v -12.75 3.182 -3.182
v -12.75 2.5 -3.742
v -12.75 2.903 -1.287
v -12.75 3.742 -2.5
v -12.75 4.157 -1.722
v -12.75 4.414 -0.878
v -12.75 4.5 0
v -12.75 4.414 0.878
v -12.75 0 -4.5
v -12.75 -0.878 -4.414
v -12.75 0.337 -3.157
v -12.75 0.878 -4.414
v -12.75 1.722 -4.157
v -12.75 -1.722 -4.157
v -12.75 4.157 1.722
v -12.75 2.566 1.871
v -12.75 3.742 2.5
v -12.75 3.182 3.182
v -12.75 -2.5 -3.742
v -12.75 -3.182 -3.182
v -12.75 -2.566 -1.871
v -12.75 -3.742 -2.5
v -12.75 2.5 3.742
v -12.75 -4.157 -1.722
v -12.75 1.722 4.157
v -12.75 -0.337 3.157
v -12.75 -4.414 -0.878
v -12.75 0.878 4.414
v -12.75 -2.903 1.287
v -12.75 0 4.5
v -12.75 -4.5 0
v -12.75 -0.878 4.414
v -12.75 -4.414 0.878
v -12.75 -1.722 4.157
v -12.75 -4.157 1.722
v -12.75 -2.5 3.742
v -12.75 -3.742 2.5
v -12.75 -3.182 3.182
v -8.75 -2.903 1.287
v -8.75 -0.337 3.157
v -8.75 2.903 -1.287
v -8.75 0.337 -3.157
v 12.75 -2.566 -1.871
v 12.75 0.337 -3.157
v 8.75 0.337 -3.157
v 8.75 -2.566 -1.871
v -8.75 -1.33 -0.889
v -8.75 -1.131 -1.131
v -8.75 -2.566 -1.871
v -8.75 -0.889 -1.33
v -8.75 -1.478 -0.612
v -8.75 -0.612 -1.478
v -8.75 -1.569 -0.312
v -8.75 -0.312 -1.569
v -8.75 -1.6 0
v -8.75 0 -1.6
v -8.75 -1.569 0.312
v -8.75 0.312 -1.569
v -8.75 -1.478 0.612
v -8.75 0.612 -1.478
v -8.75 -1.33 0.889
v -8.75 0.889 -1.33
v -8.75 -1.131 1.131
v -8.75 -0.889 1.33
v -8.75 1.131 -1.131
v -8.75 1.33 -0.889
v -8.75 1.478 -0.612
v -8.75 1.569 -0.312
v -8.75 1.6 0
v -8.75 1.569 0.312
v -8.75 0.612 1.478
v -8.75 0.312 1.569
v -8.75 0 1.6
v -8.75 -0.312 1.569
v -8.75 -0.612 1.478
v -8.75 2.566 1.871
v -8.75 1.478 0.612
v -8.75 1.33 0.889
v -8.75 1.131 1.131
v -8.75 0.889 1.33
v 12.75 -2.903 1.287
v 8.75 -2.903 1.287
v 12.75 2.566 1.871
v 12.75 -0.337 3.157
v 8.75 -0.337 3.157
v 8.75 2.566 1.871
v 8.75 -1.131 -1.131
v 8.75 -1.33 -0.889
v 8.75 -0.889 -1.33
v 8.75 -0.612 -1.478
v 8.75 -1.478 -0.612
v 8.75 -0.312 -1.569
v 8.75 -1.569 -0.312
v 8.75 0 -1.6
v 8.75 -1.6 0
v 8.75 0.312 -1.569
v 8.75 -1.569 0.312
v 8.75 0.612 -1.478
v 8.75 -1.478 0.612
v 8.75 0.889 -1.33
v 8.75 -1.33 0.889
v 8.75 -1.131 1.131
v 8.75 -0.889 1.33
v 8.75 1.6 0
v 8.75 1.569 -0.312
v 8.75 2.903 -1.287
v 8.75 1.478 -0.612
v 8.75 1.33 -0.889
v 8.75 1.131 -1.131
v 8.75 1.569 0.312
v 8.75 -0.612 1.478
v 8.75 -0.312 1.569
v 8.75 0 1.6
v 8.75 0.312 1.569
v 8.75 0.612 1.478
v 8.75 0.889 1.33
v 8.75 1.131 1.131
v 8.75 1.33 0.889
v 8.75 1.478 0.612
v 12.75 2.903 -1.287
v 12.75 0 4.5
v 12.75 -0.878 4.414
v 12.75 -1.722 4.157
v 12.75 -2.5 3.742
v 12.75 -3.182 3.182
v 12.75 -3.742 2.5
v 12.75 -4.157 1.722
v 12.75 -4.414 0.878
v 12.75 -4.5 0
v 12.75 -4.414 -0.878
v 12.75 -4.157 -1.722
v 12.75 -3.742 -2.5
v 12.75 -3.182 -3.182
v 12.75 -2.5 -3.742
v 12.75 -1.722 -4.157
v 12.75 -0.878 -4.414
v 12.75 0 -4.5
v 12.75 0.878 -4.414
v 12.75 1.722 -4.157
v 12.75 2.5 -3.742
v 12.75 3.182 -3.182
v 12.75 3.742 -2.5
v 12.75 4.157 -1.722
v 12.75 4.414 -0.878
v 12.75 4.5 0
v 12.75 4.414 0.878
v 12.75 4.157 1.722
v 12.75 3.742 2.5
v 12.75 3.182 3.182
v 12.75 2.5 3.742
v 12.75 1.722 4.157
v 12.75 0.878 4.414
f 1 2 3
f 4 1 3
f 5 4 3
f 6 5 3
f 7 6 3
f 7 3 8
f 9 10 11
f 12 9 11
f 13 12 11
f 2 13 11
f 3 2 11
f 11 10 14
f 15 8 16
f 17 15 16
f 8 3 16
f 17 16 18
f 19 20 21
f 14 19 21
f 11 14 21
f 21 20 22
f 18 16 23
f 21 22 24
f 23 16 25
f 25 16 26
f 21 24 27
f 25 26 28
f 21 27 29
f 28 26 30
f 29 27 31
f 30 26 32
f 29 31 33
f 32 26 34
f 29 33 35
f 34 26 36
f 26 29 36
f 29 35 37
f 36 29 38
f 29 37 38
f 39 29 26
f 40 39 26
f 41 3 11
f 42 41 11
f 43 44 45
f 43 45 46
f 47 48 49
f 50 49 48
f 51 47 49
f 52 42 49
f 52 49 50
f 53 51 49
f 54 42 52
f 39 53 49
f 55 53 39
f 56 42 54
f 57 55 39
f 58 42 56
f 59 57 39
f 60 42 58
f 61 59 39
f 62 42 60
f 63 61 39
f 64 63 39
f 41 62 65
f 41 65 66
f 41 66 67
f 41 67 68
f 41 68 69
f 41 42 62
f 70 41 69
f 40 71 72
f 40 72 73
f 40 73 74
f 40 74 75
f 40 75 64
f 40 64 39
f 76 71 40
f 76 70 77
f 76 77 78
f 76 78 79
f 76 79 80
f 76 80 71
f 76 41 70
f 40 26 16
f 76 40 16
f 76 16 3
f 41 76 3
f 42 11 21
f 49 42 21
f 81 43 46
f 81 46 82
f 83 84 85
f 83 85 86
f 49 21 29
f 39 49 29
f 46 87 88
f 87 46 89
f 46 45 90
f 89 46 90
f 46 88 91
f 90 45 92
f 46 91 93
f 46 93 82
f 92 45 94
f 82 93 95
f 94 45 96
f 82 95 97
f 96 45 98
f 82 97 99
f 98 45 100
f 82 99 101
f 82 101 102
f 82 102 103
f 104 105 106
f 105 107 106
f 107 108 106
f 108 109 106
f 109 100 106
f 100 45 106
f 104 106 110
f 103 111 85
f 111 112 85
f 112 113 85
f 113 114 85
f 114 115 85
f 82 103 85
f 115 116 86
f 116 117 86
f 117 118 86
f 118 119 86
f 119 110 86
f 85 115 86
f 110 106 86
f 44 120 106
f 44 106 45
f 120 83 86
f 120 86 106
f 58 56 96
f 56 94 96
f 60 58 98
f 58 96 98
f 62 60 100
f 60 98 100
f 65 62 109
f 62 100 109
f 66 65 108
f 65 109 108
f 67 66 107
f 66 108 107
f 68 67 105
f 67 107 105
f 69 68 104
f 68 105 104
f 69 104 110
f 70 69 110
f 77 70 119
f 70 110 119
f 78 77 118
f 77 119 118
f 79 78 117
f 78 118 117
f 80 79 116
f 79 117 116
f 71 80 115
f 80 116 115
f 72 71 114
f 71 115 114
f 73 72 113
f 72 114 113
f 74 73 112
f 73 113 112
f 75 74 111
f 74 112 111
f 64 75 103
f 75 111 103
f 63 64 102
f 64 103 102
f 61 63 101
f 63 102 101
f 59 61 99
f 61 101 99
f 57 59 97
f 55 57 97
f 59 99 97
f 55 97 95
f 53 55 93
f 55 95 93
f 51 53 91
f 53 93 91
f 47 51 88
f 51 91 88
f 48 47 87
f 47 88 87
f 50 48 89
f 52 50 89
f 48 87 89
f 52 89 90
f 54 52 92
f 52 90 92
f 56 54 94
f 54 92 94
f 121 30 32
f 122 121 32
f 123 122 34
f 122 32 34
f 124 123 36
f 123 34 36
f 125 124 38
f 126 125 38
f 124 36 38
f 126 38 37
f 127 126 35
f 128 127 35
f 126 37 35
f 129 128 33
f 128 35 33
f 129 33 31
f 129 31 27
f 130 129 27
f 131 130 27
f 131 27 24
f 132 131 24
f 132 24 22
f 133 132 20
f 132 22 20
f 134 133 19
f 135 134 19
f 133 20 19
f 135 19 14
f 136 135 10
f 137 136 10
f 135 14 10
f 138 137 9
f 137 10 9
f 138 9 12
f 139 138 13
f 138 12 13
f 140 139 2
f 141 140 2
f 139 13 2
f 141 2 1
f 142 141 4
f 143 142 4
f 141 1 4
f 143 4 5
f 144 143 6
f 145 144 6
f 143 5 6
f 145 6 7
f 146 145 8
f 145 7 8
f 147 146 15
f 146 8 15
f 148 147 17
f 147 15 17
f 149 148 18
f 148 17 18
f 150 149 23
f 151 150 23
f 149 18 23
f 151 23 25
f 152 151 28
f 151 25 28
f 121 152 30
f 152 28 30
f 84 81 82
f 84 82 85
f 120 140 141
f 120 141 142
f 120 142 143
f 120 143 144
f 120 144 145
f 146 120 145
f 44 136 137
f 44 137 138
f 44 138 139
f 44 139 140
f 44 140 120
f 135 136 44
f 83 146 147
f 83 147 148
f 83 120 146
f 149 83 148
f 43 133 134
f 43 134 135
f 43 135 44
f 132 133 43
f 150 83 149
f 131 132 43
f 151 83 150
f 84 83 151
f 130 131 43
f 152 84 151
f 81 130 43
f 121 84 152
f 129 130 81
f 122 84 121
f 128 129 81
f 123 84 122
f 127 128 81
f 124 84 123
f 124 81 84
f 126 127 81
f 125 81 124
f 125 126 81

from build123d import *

# Parameters (mm, degrees)
BOSS_EXTRUDE1_DEPTH            = 12.75
BOSS_EXTRUDE1_DEPTH_BACK       = 12.75
SKETCH1_R                      = 4.5
CUT_EXTRUDE1_DEPTH             = 4
CUT_EXTRUDE3_REACH             = 16.25
SKETCH4_R                      = 1.6
CUT_EXTRUDE3_DIRECTION_2_REACH = 16.25


with BuildPart() as part:
    # Sketch1 → Boss-Extrude1 (new, two sides: drawn at the far end of the back side and taken through both)
    with BuildSketch(Plane(origin=(0, 0, 0), x_dir=(0, 0, -1), z_dir=(1, 0, 0)).offset(-BOSS_EXTRUDE1_DEPTH_BACK)):
        with Locations(Location((0, 0, 0), (0, 0, 180))):
            Circle(SKETCH1_R)
    extrude(amount=BOSS_EXTRUDE1_DEPTH + BOSS_EXTRUDE1_DEPTH_BACK)

    # Sketch2 → Cut-Extrude1 (cut)
    with BuildSketch(Plane.ZY.offset(12.75)):
        Polygon((3.157465818, -0.337257977), (1.870806885, 2.565816621), (-1.286658933, 2.903074598), (-3.157465818, 0.337257977), (-1.870806885, -2.565816621), (1.286658933, -2.903074598), align=None)
    cut_extrude1 = extrude(amount=-CUT_EXTRUDE1_DEPTH, mode=Mode.SUBTRACT)

    # Mirror1: Cut-Extrude1 across plane
    add(cut_extrude1.mirror(Plane(origin=(0, 0, 0), x_dir=(0, 0, 1), z_dir=(1, 0, 0))), mode=Mode.SUBTRACT)

    # Cut-Extrude3: up to this face of the body (flat: up to its plane)
    cut_extrude3_end = Plane(part.part.faces().sort_by_distance((-8.75, 0, 0))[0])
    # Sketch4 → Cut-Extrude3 (cut, up to the picked face)
    with BuildSketch(Plane(origin=(0, 0, 0), x_dir=(0, 0, -1), z_dir=(1, 0, 0)), mode=Mode.PRIVATE) as cut_extrude3_sk1:
        Circle(SKETCH4_R)
    cut_extrude3_tool1 = split(extrude(cut_extrude3_sk1.sketch, amount=-CUT_EXTRUDE3_REACH, mode=Mode.PRIVATE), bisect_by=cut_extrude3_end, keep=Keep.BOTH, mode=Mode.PRIVATE)
    add(cut_extrude3_tool1.solids().sort_by(Axis((0, 0, 0), (-1, 0, 0)))[0], mode=Mode.SUBTRACT)

    # Cut-Extrude3 direction 2: up to this face of the body (flat: up to its plane)
    cut_extrude3_direction_2_end = Plane(part.part.faces().sort_by_distance((8.75, 0, 0))[0])
    # Sketch4 → Cut-Extrude3 direction 2 (cut, up to the picked face)
    with BuildSketch(Plane(origin=(0, 0, 0), x_dir=(0, 0, -1), z_dir=(1, 0, 0)), mode=Mode.PRIVATE) as cut_extrude3_direction_2_sk1:
        Circle(SKETCH4_R)
    cut_extrude3_direction_2_tool1 = split(extrude(cut_extrude3_direction_2_sk1.sketch, amount=CUT_EXTRUDE3_DIRECTION_2_REACH, mode=Mode.PRIVATE), bisect_by=cut_extrude3_direction_2_end, keep=Keep.BOTH, mode=Mode.PRIVATE)
    add(cut_extrude3_direction_2_tool1.solids().sort_by(Axis((0, 0, 0), (1, 0, 0)))[0], mode=Mode.SUBTRACT)


solid = part.part
